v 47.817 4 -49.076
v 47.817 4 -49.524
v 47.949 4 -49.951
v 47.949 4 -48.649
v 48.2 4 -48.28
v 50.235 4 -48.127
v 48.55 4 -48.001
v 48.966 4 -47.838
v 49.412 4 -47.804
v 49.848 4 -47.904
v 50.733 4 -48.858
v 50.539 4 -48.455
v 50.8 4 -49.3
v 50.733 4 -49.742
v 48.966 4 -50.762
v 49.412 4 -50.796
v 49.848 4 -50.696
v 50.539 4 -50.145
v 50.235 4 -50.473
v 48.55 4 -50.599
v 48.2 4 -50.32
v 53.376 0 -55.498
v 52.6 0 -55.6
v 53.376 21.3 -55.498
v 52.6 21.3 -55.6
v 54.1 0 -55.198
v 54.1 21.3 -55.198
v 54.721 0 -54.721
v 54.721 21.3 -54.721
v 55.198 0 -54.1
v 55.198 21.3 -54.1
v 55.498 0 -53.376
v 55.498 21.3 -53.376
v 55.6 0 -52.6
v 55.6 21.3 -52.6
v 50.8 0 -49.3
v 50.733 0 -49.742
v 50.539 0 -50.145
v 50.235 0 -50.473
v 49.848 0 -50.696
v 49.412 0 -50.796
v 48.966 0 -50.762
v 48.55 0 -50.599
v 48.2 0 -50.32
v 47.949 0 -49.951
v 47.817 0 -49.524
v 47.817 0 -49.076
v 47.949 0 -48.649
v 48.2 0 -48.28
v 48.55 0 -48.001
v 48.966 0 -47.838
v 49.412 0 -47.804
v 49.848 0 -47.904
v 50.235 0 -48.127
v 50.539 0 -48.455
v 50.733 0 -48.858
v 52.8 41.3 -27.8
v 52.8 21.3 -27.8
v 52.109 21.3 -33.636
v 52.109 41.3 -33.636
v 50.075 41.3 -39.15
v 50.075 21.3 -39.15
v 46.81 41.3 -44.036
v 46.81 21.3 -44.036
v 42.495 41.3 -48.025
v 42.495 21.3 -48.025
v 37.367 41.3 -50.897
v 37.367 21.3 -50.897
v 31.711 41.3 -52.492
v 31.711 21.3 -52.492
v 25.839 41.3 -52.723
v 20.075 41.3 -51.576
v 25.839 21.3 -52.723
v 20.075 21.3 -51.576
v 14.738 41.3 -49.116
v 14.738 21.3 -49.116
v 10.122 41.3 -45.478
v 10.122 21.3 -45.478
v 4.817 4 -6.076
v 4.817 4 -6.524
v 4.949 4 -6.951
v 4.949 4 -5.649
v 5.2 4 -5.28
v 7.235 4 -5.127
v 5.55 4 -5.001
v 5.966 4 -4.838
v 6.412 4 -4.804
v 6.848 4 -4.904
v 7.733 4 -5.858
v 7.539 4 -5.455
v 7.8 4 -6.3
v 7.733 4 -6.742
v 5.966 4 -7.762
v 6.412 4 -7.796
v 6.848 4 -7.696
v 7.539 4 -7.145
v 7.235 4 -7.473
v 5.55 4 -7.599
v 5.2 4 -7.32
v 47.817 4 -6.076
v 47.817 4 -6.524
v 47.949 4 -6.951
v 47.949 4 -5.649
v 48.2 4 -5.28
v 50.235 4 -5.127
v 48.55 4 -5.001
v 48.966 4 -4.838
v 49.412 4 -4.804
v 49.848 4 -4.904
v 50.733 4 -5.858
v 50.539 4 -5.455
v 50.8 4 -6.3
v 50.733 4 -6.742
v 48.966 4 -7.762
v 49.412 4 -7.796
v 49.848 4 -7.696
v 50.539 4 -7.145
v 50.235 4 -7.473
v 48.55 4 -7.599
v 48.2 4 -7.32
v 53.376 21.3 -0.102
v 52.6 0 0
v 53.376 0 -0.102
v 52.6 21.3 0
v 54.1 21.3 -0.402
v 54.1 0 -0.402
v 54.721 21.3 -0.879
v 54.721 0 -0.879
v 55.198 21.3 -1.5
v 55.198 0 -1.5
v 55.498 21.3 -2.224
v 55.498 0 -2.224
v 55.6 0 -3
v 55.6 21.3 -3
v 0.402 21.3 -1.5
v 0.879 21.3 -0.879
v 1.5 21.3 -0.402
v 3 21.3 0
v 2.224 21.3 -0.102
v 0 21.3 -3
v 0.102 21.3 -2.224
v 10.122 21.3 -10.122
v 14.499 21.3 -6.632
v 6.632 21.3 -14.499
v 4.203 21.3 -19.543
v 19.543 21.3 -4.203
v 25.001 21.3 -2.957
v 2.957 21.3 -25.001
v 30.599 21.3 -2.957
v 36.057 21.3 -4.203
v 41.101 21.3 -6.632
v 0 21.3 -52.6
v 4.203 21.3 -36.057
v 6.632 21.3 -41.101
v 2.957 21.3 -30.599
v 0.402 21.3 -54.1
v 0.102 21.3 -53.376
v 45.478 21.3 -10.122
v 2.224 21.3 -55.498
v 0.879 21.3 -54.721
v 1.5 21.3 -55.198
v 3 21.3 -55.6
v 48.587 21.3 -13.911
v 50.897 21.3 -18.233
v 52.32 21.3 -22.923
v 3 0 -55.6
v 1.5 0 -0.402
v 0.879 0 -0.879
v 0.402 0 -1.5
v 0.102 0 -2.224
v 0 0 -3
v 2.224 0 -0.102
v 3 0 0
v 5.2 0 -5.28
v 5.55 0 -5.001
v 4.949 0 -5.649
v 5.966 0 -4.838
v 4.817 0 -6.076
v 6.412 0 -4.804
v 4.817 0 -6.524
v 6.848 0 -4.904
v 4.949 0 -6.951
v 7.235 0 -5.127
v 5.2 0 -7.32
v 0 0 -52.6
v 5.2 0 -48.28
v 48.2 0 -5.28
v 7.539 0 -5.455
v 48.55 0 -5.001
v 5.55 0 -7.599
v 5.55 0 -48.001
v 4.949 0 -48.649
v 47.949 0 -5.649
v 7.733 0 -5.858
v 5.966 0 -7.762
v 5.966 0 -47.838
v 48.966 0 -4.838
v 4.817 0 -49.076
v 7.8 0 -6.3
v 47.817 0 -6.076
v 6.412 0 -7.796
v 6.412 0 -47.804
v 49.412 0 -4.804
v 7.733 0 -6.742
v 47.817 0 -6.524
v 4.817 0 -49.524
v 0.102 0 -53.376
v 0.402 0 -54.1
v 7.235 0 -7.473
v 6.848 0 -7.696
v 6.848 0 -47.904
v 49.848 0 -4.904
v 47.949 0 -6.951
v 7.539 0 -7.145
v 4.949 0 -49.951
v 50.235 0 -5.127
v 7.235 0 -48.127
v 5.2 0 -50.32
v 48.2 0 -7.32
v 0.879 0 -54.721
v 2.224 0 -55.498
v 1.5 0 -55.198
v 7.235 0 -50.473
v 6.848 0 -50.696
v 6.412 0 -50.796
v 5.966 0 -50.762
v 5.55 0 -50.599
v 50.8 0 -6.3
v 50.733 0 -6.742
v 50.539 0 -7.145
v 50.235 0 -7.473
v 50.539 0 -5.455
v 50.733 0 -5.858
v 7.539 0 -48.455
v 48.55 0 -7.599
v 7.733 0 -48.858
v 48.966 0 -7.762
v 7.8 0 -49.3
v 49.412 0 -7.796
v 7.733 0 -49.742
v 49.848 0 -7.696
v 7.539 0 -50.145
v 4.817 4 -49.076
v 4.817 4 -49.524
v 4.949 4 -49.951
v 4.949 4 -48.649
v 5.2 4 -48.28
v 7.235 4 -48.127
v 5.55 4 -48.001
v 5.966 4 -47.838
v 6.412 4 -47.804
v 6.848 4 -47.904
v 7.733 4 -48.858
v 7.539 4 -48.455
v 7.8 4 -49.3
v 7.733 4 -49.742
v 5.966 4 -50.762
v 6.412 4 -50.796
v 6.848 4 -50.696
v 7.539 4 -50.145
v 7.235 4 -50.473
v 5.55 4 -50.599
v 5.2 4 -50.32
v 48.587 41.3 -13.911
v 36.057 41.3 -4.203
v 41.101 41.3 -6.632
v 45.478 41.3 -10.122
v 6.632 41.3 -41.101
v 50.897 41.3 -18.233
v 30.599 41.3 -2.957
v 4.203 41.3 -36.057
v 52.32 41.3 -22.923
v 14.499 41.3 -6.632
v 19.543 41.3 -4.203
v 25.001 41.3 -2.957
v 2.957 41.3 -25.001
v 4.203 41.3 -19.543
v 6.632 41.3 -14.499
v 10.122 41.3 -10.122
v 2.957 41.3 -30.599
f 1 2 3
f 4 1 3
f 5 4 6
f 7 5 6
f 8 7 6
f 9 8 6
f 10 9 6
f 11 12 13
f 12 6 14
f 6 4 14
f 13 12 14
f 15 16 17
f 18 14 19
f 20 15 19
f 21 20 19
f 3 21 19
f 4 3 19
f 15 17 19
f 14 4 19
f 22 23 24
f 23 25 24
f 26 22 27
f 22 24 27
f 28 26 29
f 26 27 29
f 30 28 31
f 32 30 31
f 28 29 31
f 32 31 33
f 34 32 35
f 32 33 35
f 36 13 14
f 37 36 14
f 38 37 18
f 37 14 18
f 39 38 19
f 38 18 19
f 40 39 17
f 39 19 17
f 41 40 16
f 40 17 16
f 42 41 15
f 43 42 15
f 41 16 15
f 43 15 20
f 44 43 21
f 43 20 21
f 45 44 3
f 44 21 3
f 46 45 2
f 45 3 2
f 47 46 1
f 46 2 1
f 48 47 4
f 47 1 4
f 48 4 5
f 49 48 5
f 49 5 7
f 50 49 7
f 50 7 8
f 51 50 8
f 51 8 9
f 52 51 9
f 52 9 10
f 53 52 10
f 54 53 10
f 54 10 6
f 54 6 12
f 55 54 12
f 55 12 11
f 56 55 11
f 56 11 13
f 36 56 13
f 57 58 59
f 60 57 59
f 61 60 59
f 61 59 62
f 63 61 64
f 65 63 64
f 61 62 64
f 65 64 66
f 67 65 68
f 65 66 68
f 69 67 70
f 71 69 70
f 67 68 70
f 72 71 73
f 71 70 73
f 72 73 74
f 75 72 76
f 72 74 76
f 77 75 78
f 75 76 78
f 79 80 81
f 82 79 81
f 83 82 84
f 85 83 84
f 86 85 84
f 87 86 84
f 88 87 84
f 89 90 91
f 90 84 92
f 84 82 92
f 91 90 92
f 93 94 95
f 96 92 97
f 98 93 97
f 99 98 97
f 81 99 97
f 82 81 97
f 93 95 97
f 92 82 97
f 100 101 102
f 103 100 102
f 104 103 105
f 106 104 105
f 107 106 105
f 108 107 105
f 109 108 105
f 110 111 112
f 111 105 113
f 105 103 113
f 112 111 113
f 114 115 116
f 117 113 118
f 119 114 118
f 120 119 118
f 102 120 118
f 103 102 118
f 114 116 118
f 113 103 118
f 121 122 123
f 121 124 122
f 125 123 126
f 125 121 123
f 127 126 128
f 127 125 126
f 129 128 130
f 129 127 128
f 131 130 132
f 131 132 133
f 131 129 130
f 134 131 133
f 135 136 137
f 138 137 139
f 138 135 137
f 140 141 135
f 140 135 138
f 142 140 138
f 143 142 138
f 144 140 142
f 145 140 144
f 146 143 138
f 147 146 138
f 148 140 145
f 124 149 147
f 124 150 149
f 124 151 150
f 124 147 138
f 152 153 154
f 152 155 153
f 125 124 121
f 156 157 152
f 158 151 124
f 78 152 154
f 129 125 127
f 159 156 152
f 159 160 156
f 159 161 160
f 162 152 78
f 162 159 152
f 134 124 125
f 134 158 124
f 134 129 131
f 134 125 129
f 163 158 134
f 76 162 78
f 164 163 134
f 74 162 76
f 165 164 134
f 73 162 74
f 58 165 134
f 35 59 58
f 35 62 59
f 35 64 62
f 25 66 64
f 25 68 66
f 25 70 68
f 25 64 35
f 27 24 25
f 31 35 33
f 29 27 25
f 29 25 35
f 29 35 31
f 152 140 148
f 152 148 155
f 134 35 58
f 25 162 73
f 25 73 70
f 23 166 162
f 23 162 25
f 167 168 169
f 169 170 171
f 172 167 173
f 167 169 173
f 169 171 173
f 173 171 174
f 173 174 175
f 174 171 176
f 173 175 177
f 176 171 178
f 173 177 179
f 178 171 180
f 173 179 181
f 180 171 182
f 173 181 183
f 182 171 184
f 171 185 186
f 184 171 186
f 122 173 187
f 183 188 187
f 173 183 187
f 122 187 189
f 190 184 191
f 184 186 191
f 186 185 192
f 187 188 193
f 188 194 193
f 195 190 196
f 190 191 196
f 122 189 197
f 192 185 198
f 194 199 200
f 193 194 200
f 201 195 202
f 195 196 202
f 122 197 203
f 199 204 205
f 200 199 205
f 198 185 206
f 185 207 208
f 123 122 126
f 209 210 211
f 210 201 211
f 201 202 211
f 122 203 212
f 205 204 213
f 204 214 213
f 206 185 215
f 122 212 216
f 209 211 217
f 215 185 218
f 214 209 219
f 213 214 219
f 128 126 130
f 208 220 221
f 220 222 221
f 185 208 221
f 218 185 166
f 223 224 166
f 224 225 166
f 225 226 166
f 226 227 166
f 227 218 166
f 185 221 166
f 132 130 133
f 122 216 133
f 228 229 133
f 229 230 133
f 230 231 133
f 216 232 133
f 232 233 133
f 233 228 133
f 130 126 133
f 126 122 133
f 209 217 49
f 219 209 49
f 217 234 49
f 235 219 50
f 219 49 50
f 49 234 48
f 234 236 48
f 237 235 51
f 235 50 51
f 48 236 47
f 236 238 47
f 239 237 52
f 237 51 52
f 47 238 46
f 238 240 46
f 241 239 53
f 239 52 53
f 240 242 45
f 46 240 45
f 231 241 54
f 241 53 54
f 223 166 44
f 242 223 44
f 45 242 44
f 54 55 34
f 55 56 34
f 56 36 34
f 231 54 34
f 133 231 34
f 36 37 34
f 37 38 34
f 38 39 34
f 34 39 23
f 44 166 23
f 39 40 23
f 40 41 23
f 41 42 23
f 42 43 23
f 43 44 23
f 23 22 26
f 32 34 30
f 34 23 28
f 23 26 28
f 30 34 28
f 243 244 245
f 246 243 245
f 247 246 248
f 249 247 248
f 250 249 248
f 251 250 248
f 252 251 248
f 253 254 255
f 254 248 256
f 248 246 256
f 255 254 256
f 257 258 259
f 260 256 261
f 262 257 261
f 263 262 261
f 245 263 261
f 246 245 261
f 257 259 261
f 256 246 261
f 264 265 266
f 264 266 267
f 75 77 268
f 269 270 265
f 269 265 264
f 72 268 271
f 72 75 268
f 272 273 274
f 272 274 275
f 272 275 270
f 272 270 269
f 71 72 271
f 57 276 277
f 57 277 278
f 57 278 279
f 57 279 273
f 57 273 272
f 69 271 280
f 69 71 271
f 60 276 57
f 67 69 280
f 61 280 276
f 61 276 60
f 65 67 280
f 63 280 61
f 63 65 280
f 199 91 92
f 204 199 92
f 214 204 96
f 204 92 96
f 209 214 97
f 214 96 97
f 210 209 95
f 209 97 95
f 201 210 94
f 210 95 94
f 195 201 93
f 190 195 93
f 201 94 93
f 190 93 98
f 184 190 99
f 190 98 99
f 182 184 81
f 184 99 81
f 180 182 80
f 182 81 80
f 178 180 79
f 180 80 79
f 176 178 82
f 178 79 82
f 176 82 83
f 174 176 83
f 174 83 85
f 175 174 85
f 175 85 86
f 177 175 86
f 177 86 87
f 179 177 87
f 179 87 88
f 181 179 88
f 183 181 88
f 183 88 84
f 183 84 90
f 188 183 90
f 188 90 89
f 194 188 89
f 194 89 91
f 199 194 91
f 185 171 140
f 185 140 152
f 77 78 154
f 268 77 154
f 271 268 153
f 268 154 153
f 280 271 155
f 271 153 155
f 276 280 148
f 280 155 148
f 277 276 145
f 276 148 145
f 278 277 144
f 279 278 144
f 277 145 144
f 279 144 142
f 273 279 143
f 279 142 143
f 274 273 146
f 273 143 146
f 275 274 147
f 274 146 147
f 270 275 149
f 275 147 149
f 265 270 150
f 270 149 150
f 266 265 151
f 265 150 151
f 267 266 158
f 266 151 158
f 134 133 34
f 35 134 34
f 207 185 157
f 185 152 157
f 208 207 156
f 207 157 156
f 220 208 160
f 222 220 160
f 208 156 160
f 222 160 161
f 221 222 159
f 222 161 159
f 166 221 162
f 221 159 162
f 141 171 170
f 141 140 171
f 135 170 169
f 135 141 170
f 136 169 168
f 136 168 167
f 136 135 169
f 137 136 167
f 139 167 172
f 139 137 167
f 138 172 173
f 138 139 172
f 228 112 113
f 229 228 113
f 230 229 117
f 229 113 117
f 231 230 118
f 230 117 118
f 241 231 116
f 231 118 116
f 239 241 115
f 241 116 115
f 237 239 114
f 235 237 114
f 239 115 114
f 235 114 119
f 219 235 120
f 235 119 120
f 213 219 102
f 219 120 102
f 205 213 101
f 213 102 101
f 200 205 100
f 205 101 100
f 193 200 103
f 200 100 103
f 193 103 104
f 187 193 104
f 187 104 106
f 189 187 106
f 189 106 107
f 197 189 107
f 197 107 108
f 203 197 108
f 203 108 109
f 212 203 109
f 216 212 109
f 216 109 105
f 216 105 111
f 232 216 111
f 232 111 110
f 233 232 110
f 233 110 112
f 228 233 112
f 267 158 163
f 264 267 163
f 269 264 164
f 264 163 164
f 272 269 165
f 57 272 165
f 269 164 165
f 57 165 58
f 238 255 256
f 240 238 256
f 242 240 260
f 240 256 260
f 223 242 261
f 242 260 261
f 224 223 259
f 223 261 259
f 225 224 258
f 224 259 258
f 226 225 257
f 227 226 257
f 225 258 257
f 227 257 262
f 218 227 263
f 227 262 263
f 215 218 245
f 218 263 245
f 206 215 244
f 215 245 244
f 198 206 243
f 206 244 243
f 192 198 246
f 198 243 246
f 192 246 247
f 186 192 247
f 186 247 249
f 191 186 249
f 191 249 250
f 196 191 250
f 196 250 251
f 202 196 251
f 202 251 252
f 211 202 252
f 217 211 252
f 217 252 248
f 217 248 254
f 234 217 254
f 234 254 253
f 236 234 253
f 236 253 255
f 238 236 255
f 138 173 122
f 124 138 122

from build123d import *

# Parameters (mm, degrees)
SKETCH_1_W          = 55.6
SKETCH_1_H          = 55.6
EXTRUDE_1_DEPTH     = 21.3
EXTRUDE_2_DEPTH     = 20
FILLET_1_R          = 3
HOLE_WIZARD_1_D     = 3
HOLE_WIZARD_1_DEPTH = 4


with BuildPart() as part:
    # 草图1 → 凸台-拉伸1 (new body)
    with BuildSketch(Plane(origin=(0, 0, 0), x_dir=(1, 0, 0), z_dir=(0, 1, 0))):
        with Locations((27.8, 27.8)):
            Rectangle(SKETCH_1_W, SKETCH_1_H)
    extrude(amount=EXTRUDE_1_DEPTH)

    # 草图2 → 凸台-拉伸2 (add)
    with BuildSketch(Plane(origin=(0, 21.3, 0), x_dir=(1, 0, 0), z_dir=(0, 1, 0))):
        with BuildLine():
            ThreePointArc((52.8, 27.8), (37.367085809, 50.896988313), (10.12233047, 45.47766953))
            Line((10.12233047, 45.47766953), (45.47766953, 10.12233047))
            ThreePointArc((45.47766953, 10.12233047), (50.896988313, 18.232914191), (52.8, 27.8))
        make_face()
        with BuildLine():
            Line((45.47766953, 10.12233047), (10.12233047, 45.47766953))
            ThreePointArc((10.12233047, 45.47766953), (10.12233047, 10.12233047), (45.47766953, 10.12233047))
        make_face()
    extrude(amount=EXTRUDE_2_DEPTH)

    # 圆角1
    fillet_1_edges = [part.edges().sort_by_distance(p)[0] for p in [
        (0, 10.65, -55.6),
        (55.6, 10.65, -55.6),
        (55.6, 10.65, 0),
        (0, 10.65, 0),
    ]]
    fillet(fillet_1_edges, radius=FILLET_1_R)

    # 孔1
    with Locations(Plane(origin=(0, 0, 0), x_dir=(-1, 0, 0), z_dir=(0, -1, 0))):
        with Locations((-49.3, 49.3), (-6.3, 49.3), (-6.3, 6.3), (-49.3, 6.3)):
            Hole(HOLE_WIZARD_1_D / 2, depth=HOLE_WIZARD_1_DEPTH)


solid = part.part
